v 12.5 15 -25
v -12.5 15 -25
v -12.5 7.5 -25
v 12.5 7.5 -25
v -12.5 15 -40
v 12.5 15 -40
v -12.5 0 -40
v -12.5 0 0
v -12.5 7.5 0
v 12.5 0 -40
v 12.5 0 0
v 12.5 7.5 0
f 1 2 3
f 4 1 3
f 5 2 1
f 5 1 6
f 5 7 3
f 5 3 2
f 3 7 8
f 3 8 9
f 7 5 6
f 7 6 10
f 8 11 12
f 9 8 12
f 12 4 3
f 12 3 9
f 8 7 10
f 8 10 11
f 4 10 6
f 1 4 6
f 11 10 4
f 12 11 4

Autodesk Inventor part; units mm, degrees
ref_plane "YZ Plane" through (0, 0, 0) normal (1, 0, 0) x (0, 1, 0)
ref_plane "XZ Plane" through (0, 0, 0) normal (0, 1, 0) x (-1, 0, 0)
ref_plane "XY Plane" through (0, 0, 0) normal (0, 0, 1) x (1, 0, 0)
sketch "Sketch1" plane through (0, 0, 0) normal (1, 0, 0) x (0, 1, 0)
  line L0 (0, 0) -> (15, 0)
  line L1 (15, 0) -> (15, -40)
  line L2 (15, -40) -> (0, -40)
  line L3 (0, -40) -> (0, 0)
  dimension "d0" = 40
  dimension "d1" = 15
extrude "Extrusion1" add sketch "Sketch1" along normal mid plane 25
sketch "Sketch2" plane through (12.5, 0, 0) normal (1, 0, 0) x (0, 0, -1)
  line L0 (-5, 16.2216) -> (25, 16.2216)
  line L1 (25, 16.2216) -> (25, 7.5)
  line L2 (25, 7.5) -> (-5, 7.5)
  line L3 (-5, 7.5) -> (-5, 16.2216)
  line L4 (40, 0) -> (40, 15) projected
  line L5 (0, 0) -> (40, 0) projected
  dimension "d4" = 15
  dimension "d5" = 30
  dimension "d6" = 7.5
extrude "Extrusion2" cut sketch "Sketch2" against normal through all
sketch "Sketch3" plane through (-12.5, 15, -40) normal (0, 1, 0) x (1, 0, 0)
  point P0 (12.5, -40)
